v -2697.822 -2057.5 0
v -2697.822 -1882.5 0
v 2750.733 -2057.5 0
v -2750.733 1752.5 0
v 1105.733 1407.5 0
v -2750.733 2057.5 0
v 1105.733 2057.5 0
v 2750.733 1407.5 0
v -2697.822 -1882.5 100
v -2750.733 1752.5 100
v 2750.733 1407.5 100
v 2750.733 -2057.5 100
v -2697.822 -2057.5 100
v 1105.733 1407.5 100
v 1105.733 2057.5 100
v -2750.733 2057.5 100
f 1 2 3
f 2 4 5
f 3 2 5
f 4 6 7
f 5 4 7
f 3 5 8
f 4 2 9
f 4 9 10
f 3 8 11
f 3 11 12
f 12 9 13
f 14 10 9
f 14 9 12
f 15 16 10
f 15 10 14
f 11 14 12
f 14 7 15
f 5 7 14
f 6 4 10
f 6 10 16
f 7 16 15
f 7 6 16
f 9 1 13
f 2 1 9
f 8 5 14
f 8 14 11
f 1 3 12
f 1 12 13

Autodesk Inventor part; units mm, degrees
ref_plane "YZ Plane" through (0, 0, 0) normal (1, 0, 0) x (0, 1, 0)
ref_plane "XZ Plane" through (0, 0, 0) normal (0, 1, 0) x (-1, 0, 0)
ref_plane "XY Plane" through (0, 0, 0) normal (0, 0, 1) x (1, 0, 0)
ref_plane "Plano de trabajo1" through (0, 0, 0) normal (0, 0, 1) x (1, 0, 0)
sketch "Boceto1" plane through (0, 0, 0) normal (0, 0, 1) x (1, 0, 0)
  line L0 (2750.7331, 132.5) -> (2750.7331, -2057.5) projected
  line L1 (2650.7331, 132.5) -> (2750.7331, 132.5) projected
  line L2 (2650.7331, -1957.5) -> (2650.7331, 132.5) projected
  line L3 (1090.7331, -1957.5) -> (2650.7331, -1957.5) projected
  line L4 (1090.7331, -1762.5) -> (1090.7331, -1957.5) projected
  line L5 (715.7331, -1762.5) -> (1090.7331, -1762.5) projected
  line L6 (715.7331, -1957.5) -> (715.7331, -1762.5) projected
  line L7 (-2414.2669, -1957.5) -> (715.7331, -1957.5) projected
  line L8 (-2414.2669, -1782.5) -> (-2414.2669, -1957.5) projected
  line L9 (-2599.2669, -1782.5) -> (-2414.2669, -1782.5) projected
  line L10 (-2649.2669, 1652.5) -> (-2599.2669, -1782.5) projected
  line L11 (-2469.2669, 1652.5) -> (-2649.2669, 1652.5) projected
  line L12 (-2469.2669, 1957.5) -> (-2469.2669, 1652.5) projected
  line L13 (640.7331, 1957.5) -> (-2469.2669, 1957.5) projected
  line L14 (640.7331, 1667.5) -> (640.7331, 1957.5) projected
  line L15 (1005.7331, 1667.5) -> (640.7331, 1667.5) projected
  line L16 (1005.7331, 1307.5) -> (1005.7331, 1667.5) projected
  line L17 (2650.7331, 1307.5) -> (1005.7331, 1307.5) projected
  line L18 (2650.7331, 1162.5) -> (2650.7331, 1307.5) projected
  line L19 (2750.7331, 1162.5) -> (2650.7331, 1162.5) projected
  line L20 (2750.7331, 1407.5) -> (2750.7331, 1162.5) projected
  line L21 (1105.7331, 1407.5) -> (2750.7331, 1407.5) projected
  line L22 (-2697.8219, -1882.5) -> (-2750.7331, 1752.5) projected
  line L23 (2650.7331, 1162.5) -> (2750.7331, 1162.5) projected
  line L24 (2650.7331, 132.5) -> (2650.7331, 1162.5) projected
  line L25 (2750.7331, 132.5) -> (2650.7331, 132.5) projected
  line L26 (2750.7331, 132.5) -> (2750.7331, 1162.5) projected
  line L27 (2650.7331, 1162.5) -> (2750.7331, 1162.5) projected
  line L28 (2650.7331, 132.5) -> (2650.7331, 1162.5) projected
  line L29 (2750.7331, 132.5) -> (2650.7331, 132.5) projected
  line L30 (2750.7331, 132.5) -> (2750.7331, 1162.5) projected
  line L31 (2750.7331, -2057.5) -> (-2697.8219, -2057.5) projected
  line L32 (1105.7331, 2057.5) -> (1105.7331, 1407.5) projected
  line L33 (-2750.7331, 2057.5) -> (1105.7331, 2057.5) projected
  line L34 (-2750.7331, 1752.5) -> (-2750.7331, 2057.5) projected
  line L35 (-2697.8219, -2057.5) -> (-2697.8219, -1882.5) projected
  point P0 (0, 0)
  point P1 (990.7331, -2057.5)
  point P2 (1105.7331, 1767.5)
  point P3 (740.7331, 2057.5)
  point P4 (-2569.2669, 2057.5)
  point P5 (-2514.2669, -2057.5)
  point P6 (815.7331, -2057.5)
extrude "Extrusión1" add sketch "Boceto1" along normal blind 100
sketch "Boceto2" plane through (0, 0, 0) normal (0, 0, -1) x (-1, 0, 0)
  line L0 (-1930.7331, 1162.5) -> (-2650.7331, 1162.5)
  arc A0 (-2650.7331, 442.5) -> (-1930.7331, 1162.5) centre (-2650.7331, 1162.5) ccw
  arc A1 (-2340.7331, 132.5) -> (-2650.7331, 442.5) centre (-2650.7331, 132.5) ccw
  line L1 (-2650.7331, 132.5) -> (-2340.7331, 132.5)
  point P0 (0, 0)
properties part number "Suelo"
